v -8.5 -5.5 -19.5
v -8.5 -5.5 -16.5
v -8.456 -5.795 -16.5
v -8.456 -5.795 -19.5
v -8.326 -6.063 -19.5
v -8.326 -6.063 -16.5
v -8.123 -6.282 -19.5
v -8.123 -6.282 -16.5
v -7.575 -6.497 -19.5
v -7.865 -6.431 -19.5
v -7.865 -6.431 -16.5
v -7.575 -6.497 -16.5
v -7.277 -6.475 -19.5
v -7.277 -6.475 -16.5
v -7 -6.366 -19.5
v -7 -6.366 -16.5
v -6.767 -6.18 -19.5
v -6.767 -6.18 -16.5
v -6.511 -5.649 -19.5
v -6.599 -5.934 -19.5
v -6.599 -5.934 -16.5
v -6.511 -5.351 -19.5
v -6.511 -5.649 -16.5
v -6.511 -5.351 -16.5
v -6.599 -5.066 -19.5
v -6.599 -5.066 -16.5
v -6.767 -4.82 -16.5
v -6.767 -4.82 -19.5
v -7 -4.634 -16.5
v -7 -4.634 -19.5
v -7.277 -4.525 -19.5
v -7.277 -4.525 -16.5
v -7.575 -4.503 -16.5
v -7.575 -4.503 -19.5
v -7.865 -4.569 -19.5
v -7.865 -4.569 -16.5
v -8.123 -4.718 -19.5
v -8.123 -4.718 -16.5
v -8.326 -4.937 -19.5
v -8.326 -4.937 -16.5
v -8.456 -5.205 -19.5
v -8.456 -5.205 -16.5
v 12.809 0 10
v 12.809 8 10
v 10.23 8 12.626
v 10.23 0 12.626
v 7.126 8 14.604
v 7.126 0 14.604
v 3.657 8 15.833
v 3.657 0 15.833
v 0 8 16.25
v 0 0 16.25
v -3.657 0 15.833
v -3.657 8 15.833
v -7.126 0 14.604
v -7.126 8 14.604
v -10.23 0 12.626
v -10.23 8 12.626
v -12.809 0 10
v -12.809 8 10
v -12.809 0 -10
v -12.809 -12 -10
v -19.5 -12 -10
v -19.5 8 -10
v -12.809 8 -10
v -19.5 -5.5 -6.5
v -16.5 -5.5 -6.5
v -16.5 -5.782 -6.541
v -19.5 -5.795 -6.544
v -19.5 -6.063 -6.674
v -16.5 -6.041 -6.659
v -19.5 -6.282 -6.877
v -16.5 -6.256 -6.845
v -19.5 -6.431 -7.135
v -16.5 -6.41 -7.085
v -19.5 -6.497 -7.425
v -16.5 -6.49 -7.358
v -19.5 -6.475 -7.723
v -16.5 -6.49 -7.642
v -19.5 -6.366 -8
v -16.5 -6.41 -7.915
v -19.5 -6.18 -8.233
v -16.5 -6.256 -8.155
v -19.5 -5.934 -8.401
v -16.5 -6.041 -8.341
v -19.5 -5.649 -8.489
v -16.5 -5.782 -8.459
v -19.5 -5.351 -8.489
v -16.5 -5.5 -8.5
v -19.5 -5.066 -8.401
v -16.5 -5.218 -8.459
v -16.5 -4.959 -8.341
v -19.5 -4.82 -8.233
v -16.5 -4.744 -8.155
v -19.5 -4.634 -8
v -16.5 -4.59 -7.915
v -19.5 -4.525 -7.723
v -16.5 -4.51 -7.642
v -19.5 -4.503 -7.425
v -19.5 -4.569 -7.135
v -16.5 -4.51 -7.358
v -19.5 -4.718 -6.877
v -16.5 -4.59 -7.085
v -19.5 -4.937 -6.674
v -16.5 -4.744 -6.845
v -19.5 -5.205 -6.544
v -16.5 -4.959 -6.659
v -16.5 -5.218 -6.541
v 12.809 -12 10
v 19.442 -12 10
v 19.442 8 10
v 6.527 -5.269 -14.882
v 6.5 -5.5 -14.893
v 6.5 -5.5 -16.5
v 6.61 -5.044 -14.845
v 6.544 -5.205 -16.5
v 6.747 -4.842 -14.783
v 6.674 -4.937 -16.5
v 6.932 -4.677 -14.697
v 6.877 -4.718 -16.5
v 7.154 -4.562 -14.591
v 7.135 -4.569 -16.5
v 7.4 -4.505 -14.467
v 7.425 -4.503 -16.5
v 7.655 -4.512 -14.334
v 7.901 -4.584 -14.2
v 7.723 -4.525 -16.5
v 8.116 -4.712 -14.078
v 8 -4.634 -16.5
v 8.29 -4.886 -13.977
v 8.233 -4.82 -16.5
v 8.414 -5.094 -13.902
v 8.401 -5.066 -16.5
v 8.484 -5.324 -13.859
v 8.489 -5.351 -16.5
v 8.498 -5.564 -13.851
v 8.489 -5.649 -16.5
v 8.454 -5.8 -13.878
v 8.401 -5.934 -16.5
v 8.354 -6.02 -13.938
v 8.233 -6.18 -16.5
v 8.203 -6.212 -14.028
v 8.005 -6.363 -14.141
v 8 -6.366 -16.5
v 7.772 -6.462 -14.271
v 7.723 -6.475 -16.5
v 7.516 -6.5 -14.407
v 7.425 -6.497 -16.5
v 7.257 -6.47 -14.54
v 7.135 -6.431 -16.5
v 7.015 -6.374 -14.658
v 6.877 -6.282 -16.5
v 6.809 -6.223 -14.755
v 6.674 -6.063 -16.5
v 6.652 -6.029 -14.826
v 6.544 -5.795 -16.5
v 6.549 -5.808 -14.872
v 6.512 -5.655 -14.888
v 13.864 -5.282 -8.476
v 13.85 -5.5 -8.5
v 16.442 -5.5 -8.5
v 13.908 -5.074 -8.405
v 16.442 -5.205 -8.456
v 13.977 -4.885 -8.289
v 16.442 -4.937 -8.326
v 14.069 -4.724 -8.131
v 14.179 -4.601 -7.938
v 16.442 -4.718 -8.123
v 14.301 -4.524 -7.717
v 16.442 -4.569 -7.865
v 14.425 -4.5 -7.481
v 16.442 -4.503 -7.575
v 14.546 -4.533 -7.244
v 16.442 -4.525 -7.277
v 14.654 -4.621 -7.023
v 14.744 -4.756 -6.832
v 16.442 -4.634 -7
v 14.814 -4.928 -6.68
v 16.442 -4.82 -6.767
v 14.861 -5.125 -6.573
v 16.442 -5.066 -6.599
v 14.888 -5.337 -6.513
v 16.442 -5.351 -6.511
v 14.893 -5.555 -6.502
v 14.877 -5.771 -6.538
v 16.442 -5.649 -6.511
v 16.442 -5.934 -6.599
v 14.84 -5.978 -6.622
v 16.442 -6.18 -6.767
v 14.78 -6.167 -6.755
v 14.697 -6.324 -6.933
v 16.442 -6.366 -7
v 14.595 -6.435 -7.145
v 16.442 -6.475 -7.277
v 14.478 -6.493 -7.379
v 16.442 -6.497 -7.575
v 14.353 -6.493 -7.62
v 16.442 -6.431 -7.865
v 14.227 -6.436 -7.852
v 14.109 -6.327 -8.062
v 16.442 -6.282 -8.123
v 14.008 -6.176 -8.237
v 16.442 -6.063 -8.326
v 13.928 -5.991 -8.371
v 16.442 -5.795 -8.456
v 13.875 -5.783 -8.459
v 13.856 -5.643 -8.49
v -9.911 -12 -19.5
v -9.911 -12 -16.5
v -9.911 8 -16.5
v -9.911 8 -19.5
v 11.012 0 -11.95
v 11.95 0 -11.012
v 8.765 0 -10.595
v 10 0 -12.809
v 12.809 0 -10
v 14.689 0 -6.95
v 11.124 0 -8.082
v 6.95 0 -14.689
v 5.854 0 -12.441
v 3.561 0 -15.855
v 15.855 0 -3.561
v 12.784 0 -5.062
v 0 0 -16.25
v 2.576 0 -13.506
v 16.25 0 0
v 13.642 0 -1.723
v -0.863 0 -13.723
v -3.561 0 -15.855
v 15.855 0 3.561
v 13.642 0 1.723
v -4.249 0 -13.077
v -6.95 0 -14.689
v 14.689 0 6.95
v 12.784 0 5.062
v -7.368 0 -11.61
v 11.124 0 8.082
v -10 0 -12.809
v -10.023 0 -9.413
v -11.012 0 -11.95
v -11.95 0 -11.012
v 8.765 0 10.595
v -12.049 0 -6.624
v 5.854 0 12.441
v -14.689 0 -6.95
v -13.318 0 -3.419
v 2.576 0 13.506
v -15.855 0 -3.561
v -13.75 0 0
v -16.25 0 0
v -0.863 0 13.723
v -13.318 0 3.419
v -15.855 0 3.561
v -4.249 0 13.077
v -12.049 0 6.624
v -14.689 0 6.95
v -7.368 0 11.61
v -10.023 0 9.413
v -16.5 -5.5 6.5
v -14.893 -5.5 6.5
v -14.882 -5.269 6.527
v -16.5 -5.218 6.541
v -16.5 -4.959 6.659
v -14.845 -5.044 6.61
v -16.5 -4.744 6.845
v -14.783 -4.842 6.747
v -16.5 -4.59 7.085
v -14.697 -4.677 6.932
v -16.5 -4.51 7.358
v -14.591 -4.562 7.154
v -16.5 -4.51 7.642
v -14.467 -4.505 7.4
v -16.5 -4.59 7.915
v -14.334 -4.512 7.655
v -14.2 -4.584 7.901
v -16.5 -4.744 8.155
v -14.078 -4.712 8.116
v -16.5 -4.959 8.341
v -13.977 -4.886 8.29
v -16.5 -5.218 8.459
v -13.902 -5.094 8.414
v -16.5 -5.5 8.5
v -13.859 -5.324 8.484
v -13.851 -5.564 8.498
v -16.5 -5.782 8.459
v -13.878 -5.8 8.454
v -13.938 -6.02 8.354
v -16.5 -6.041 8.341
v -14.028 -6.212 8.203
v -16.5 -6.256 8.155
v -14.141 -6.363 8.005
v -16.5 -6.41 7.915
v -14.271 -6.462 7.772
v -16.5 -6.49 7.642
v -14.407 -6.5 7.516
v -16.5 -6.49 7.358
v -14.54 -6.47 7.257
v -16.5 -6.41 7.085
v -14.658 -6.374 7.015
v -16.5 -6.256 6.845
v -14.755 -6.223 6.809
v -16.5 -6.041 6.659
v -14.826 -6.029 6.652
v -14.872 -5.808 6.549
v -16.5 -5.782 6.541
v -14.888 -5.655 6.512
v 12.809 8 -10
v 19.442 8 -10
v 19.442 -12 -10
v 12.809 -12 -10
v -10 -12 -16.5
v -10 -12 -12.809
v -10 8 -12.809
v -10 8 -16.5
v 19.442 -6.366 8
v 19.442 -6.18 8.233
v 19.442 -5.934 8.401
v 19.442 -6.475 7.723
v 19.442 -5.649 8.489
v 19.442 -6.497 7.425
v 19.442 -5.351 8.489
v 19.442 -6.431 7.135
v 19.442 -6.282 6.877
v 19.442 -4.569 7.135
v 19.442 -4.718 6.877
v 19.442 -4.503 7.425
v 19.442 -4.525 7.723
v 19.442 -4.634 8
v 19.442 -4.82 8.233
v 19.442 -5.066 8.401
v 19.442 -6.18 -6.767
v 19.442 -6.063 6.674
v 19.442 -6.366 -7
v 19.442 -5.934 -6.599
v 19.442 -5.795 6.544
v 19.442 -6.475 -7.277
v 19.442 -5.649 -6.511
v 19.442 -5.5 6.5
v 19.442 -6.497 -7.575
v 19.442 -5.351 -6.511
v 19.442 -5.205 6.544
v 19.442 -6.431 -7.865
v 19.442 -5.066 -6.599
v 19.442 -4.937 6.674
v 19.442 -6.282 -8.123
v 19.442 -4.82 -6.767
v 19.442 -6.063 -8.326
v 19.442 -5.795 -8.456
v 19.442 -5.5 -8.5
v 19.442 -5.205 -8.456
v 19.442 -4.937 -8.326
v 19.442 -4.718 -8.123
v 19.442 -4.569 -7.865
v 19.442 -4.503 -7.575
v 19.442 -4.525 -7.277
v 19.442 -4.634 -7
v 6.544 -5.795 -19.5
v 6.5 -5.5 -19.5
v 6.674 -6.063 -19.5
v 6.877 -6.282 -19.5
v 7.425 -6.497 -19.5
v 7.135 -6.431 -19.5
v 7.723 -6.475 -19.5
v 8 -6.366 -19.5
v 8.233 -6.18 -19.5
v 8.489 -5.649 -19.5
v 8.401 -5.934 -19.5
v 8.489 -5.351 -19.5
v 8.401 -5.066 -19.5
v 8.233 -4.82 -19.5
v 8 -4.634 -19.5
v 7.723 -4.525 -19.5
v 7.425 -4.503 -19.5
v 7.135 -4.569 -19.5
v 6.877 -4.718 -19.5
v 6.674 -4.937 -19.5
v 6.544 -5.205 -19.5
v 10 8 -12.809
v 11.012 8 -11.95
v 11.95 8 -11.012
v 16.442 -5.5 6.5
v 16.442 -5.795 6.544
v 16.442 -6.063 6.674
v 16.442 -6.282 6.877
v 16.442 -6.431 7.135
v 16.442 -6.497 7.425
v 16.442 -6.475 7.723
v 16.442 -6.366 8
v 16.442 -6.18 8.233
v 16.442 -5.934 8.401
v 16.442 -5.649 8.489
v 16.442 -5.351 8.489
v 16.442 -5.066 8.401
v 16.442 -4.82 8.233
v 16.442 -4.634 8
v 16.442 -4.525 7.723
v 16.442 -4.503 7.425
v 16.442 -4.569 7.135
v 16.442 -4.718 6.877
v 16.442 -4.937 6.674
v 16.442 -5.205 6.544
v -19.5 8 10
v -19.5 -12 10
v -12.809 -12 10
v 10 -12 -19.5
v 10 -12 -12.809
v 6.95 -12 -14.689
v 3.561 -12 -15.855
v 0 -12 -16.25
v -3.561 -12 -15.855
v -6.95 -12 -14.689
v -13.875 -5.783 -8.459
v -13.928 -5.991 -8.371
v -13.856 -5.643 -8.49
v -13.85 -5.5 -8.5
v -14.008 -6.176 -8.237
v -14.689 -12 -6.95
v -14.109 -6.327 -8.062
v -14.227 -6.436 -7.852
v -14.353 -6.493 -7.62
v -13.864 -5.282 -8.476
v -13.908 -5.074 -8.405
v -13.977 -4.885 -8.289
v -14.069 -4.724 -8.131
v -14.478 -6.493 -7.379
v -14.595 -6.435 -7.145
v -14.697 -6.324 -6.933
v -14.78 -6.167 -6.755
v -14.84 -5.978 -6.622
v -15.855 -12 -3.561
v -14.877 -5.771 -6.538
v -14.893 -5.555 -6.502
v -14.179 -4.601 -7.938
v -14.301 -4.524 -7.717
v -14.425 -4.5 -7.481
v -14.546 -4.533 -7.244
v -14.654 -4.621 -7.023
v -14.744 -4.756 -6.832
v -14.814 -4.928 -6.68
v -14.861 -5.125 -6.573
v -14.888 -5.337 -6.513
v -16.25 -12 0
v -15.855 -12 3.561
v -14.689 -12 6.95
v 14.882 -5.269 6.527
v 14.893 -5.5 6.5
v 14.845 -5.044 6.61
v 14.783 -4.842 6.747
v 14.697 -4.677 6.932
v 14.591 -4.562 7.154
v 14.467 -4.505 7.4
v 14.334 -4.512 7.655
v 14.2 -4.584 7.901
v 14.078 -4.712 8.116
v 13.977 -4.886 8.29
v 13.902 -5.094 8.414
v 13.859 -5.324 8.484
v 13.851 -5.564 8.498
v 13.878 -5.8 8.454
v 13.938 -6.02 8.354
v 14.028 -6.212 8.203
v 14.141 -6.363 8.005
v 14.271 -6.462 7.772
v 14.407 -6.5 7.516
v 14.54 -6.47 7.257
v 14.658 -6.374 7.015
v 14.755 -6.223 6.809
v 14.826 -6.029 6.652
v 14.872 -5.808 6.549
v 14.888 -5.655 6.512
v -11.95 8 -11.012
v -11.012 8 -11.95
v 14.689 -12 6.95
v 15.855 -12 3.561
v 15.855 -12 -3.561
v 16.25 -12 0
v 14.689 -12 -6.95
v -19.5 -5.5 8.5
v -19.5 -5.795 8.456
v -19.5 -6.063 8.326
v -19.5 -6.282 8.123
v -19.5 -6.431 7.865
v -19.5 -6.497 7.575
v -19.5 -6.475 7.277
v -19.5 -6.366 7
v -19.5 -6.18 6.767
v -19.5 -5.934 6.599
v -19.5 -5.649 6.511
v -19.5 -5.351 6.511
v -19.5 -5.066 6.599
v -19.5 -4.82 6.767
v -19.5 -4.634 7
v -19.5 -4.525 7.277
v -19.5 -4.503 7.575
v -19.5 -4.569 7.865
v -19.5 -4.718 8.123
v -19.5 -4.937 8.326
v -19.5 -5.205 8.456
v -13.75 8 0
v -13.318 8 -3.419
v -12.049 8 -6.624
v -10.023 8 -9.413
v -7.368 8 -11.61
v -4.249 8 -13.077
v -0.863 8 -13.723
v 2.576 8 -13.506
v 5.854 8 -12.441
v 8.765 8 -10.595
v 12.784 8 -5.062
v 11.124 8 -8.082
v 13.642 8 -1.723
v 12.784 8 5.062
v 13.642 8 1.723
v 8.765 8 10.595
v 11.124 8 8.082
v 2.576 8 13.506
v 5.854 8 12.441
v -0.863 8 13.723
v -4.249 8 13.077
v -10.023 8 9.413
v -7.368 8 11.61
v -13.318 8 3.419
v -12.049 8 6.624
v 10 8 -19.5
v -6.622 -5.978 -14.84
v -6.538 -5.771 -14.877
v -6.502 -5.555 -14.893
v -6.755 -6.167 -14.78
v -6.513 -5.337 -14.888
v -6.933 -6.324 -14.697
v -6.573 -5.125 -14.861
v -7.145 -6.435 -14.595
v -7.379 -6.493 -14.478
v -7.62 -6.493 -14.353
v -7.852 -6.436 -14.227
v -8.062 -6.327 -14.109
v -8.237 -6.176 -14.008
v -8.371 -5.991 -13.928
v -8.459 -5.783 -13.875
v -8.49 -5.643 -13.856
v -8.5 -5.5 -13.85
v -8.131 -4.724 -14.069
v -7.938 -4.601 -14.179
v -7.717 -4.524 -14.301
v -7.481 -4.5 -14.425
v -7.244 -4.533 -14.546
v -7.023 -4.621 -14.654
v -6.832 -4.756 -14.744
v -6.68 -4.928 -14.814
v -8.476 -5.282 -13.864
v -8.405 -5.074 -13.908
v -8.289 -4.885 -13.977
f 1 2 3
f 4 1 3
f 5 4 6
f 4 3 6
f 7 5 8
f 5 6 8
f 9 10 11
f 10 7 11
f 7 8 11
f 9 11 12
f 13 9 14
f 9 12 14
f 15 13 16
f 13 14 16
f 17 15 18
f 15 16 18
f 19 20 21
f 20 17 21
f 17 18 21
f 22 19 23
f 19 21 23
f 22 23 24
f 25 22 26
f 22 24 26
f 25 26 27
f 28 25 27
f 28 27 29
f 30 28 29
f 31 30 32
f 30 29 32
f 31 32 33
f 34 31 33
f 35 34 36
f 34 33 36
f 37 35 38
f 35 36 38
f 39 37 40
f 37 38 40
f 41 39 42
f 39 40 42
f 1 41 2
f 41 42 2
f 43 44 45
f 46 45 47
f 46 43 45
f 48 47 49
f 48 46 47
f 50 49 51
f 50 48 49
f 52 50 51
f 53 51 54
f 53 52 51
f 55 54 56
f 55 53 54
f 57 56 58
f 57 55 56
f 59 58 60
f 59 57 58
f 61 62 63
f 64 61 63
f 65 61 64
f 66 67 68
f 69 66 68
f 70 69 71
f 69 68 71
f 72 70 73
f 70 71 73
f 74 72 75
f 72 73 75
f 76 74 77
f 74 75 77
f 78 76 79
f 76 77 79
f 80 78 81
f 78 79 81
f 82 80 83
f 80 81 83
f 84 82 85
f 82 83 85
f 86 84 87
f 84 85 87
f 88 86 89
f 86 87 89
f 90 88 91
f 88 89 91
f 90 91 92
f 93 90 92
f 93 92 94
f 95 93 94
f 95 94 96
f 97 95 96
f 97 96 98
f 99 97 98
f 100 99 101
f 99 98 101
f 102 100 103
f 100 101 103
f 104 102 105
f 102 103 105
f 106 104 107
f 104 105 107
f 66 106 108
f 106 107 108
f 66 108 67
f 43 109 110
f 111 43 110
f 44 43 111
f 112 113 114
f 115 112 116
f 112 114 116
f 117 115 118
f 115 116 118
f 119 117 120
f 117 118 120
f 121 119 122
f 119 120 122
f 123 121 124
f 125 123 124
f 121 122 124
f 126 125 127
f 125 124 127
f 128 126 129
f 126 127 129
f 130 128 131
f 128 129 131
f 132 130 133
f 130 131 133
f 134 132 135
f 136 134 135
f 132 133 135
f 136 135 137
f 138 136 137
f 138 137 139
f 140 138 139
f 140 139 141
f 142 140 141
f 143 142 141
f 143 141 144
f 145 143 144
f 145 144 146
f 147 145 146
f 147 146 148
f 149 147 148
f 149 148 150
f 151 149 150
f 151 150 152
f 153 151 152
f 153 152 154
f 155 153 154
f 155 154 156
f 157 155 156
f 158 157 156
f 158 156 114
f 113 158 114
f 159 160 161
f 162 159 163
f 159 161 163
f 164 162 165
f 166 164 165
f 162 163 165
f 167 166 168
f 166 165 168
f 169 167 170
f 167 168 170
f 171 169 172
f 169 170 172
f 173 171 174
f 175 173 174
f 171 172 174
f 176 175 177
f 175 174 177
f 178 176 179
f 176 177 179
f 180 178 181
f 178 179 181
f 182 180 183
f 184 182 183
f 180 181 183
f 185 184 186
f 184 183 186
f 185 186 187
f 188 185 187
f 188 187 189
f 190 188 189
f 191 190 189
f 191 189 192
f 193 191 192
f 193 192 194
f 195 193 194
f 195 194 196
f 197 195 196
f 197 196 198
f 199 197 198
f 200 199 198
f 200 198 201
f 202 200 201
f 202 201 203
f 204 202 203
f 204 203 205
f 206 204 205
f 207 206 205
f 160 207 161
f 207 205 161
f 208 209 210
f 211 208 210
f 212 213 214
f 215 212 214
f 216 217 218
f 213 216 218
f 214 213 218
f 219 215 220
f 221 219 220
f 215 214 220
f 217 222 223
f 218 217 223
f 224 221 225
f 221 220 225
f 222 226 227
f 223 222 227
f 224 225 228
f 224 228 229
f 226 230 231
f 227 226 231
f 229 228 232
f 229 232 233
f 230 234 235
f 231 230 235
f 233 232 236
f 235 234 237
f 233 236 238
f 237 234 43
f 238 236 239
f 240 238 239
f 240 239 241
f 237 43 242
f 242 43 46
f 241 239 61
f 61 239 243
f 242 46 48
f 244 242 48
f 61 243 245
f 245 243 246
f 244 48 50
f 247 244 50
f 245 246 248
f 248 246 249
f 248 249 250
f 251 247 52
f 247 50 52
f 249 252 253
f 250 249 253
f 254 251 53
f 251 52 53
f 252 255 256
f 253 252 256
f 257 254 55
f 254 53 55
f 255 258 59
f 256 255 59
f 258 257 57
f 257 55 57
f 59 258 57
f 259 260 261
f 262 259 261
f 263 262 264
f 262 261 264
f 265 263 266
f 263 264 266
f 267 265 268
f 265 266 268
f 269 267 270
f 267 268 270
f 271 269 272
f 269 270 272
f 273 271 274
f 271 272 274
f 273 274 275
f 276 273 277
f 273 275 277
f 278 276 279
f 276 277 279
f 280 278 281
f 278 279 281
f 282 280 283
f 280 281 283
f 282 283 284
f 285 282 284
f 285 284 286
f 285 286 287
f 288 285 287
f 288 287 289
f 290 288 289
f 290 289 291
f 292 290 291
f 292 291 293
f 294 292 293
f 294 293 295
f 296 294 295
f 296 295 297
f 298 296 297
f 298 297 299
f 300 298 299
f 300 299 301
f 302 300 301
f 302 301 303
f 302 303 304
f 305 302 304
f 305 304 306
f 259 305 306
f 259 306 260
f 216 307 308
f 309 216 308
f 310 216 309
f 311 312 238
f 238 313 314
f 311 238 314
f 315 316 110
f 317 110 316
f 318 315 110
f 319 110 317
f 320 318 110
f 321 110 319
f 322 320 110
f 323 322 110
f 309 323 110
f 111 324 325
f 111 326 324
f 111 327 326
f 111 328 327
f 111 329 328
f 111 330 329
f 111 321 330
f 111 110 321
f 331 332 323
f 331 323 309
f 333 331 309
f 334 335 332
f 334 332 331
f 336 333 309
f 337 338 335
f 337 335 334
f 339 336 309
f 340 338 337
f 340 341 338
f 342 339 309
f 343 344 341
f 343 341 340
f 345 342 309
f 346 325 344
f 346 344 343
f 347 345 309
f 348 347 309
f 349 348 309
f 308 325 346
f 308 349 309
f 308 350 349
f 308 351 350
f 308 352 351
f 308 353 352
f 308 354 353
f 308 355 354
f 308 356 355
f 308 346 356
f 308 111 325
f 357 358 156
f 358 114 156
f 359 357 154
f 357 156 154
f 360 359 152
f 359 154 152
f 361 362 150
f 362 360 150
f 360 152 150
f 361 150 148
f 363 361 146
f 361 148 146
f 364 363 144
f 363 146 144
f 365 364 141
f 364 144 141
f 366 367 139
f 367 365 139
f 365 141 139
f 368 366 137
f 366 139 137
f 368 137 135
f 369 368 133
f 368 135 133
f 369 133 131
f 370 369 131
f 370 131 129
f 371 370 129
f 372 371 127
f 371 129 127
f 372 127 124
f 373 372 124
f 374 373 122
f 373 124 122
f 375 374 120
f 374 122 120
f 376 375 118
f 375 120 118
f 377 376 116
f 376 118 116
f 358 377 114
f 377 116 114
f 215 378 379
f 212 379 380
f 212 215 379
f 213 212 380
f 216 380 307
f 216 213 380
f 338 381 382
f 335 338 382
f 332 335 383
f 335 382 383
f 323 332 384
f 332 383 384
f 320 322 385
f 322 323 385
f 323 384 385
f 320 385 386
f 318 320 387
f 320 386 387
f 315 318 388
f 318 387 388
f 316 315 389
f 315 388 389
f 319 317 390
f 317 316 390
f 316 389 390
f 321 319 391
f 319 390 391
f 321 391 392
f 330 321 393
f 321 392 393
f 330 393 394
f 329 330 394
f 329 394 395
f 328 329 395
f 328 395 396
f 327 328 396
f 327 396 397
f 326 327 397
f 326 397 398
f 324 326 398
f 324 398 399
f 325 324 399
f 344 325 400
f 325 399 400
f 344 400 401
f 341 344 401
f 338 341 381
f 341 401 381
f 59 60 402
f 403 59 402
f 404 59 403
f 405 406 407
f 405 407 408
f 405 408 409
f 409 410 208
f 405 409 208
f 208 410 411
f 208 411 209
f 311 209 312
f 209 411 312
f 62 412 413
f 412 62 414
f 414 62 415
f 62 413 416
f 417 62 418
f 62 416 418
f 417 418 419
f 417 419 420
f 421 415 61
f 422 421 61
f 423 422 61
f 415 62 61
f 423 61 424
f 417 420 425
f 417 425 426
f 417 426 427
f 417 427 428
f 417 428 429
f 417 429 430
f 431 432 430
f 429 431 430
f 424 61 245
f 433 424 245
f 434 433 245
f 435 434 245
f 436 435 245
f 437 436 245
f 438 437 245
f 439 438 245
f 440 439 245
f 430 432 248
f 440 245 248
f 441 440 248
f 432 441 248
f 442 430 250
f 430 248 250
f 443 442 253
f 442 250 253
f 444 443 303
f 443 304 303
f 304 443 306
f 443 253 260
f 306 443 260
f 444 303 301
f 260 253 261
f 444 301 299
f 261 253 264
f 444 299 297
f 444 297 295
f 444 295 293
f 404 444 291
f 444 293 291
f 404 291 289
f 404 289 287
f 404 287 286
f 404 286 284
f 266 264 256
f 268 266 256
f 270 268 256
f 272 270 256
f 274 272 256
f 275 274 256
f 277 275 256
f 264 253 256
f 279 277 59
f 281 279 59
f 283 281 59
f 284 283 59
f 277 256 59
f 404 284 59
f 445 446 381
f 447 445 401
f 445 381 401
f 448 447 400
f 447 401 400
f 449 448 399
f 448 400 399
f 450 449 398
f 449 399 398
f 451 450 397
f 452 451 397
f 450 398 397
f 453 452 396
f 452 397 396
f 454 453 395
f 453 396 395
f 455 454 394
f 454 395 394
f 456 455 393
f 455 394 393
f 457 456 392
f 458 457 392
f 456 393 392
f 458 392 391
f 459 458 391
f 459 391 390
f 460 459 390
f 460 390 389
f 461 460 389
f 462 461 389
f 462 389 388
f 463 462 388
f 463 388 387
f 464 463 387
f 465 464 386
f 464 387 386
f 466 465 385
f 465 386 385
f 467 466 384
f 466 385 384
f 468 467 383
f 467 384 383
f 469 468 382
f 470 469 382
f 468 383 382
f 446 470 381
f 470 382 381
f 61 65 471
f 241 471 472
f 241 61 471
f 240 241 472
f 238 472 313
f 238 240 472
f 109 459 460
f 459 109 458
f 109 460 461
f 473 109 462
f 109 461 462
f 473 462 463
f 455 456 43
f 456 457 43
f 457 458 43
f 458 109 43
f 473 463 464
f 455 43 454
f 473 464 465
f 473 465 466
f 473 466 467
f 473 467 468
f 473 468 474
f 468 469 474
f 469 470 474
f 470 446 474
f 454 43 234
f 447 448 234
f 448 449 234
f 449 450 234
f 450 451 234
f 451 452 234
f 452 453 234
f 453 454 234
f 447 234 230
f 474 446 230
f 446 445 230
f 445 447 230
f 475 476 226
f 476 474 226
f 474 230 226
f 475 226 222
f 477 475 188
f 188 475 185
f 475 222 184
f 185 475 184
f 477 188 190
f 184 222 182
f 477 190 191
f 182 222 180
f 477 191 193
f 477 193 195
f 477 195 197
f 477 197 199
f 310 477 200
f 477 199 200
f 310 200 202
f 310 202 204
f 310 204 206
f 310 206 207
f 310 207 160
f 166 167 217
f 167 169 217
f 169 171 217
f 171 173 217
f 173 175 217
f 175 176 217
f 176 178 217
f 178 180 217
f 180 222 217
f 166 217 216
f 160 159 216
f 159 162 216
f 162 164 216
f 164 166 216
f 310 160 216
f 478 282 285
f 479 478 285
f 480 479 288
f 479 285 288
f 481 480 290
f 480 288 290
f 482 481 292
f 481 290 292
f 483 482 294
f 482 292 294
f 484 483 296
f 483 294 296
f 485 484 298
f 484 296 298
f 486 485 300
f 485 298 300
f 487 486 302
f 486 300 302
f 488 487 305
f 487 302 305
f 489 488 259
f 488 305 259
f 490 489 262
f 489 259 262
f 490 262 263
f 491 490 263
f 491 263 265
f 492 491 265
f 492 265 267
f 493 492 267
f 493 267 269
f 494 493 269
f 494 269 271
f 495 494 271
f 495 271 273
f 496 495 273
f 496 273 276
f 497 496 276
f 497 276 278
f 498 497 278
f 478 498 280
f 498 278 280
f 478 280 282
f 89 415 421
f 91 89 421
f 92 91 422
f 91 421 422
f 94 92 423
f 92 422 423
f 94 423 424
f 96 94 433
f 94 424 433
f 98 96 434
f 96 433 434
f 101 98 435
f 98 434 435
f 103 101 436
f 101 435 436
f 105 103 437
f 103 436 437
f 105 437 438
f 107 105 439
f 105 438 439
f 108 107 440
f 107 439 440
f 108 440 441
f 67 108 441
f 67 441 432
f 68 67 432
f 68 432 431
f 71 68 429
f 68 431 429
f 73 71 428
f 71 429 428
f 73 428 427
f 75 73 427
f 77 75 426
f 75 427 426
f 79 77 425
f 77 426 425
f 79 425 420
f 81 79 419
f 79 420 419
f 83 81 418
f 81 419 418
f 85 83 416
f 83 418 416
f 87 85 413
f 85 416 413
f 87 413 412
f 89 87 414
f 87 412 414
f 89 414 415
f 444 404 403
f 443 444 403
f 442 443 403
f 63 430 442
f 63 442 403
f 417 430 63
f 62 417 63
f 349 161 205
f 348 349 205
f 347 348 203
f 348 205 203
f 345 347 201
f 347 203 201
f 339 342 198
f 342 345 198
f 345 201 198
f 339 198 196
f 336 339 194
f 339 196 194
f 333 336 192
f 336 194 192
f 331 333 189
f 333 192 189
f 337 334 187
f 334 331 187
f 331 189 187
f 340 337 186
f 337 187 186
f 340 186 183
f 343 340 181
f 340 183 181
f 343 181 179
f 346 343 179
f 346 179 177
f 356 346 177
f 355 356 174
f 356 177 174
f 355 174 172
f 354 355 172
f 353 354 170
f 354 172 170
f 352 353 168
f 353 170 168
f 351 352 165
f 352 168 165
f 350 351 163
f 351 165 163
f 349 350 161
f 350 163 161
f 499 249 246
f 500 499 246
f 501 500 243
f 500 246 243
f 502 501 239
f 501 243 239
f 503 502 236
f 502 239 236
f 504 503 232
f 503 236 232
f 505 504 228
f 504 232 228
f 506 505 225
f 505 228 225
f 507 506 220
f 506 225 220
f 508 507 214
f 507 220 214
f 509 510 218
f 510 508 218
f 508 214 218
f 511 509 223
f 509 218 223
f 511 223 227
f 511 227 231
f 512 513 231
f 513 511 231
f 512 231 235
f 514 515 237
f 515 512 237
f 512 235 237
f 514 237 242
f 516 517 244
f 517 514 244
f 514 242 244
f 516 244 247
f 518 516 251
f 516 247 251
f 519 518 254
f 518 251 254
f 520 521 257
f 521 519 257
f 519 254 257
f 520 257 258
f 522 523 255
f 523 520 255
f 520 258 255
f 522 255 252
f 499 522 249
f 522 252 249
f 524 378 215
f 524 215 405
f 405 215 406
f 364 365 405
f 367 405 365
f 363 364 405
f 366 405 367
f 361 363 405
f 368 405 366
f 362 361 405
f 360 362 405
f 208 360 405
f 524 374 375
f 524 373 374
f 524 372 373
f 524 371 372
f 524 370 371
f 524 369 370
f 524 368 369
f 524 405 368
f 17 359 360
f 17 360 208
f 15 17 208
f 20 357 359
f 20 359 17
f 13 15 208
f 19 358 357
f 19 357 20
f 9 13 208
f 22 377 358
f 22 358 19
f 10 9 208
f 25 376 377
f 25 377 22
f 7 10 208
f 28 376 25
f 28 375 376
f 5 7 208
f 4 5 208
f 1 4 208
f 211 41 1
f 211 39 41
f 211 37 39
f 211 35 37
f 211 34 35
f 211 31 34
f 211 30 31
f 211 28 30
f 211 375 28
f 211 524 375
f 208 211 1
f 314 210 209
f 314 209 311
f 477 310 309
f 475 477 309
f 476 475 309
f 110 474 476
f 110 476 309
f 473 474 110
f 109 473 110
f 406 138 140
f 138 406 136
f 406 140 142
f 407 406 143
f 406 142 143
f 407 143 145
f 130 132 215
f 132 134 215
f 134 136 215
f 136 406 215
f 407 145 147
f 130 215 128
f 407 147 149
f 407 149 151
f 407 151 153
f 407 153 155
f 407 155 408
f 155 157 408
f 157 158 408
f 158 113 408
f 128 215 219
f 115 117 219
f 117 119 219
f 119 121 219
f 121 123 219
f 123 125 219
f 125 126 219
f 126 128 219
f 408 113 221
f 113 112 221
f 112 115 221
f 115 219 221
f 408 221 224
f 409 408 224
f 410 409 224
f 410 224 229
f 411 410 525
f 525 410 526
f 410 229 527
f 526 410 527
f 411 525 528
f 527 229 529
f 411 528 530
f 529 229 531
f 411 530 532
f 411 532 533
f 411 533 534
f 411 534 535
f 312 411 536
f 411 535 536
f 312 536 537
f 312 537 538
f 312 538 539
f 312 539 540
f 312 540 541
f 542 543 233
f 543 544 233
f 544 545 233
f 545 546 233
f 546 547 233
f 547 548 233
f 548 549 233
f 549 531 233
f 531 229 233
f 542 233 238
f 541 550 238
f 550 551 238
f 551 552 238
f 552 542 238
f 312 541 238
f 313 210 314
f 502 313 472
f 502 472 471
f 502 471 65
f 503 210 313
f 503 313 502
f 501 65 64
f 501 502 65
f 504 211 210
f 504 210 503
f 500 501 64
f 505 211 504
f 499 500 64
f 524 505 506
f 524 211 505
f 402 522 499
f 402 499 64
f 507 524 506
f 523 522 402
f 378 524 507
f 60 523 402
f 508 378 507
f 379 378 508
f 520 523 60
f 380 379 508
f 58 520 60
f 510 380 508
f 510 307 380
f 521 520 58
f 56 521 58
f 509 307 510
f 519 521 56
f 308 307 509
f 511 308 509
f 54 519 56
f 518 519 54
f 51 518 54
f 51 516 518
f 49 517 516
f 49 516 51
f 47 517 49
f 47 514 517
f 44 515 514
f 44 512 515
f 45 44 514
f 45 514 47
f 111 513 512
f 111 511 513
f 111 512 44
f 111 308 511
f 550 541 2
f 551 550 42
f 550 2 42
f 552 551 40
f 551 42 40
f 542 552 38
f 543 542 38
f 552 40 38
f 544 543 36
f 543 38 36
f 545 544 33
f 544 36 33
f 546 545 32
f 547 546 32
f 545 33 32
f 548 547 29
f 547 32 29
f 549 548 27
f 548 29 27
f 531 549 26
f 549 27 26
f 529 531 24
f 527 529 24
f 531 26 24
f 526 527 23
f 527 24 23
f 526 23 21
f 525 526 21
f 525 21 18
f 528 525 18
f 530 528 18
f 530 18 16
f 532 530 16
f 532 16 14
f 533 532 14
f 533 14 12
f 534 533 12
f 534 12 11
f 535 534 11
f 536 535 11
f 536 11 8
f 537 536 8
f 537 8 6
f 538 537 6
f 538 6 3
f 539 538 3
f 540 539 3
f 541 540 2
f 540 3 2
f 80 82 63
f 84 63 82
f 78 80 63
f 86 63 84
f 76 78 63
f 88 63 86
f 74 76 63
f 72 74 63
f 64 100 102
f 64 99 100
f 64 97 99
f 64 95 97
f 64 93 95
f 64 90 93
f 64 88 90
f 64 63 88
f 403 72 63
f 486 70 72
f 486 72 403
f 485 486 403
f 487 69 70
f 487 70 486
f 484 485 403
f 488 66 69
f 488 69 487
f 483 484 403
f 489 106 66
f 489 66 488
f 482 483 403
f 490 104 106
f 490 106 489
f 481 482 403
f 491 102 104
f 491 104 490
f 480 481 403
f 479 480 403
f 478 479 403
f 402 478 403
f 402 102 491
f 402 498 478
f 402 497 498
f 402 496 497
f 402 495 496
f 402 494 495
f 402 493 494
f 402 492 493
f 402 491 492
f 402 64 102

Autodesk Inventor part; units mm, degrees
ref_plane "YZ Plane" through (0, 0, 0) normal (1, 0, 0) x (0, 1, 0)
ref_plane "XZ Plane" through (0, 0, 0) normal (0, 1, 0) x (-1, 0, 0)
sketch "Sketch1" plane through (0, 0, 0) normal (0, 1, 0) x (-1, 0, 0)
  circle A0 centre (0, 0) radius 13.75
  circle A1 centre (0, 0) radius 16.25
  dimension "d0" = 27.5
  dimension "d5" = 32.5
sketch "Sketch2" plane through (0, 0, 0) normal (0, 1, 0) x (-1, 0, 0)
  line L0 (21.5, 21.5) -> (-21.5, 21.5)
  line L1 (-21.5, 21.5) -> (-21.5, -21.5)
  line L2 (-21.5, -21.5) -> (21.5, -21.5)
  line L3 (21.5, -21.5) -> (21.5, 21.5)
  point P0 (0, 0)
  dimension "d1" = 43
  dimension "d2" = 43
  dimension "d3" = 21.5
  dimension "d4" = 21.5
extrude "Extrusion1" add sketch "Sketch1" along normal blind 8
sketch "Sketch3" plane through (0, 8, 0) normal (0, 1, 0) x (1, 0, 0)
  line L0 (-17.7413, 16.25) -> (19.579, 16.25) construction
  line L1 (16.25, -18.4481) -> (16.25, 20.2858) construction
  line L2 (-16.25, -20.7099) -> (-16.25, 21.9822) construction
  line L3 (-16.5, 16.25) -> (16.5, 16.25) construction
  line L4 (16.5, 16.25) -> (16.5, 31.25) construction
  line L5 (16.5, 31.25) -> (-16.5, 31.25) construction
  line L6 (-16.5, 31.25) -> (-16.5, 16.25) construction
  circle A0 centre (0, 0) radius 16.25 projected
  line L7 (-16.25, -16.5) -> (-31.25, -16.5) construction
  line L8 (-31.25, -16.5) -> (-31.25, 16.5) construction
  line L9 (-31.25, 16.5) -> (-16.25, 16.5) construction
  line L10 (-16.25, 16.5) -> (-16.25, -16.5) construction
  line L11 (16.25, -16.5) -> (31.25, -16.5) construction
  line L12 (31.25, -16.5) -> (31.25, 16.5) construction
  line L13 (31.25, 16.5) -> (16.25, 16.5) construction
  line L14 (16.25, 16.5) -> (16.25, -16.5) construction
  line L15 (-16.5, -16.5) -> (16.25, -16.5)
  line L16 (16.5, 16.5) -> (16.5, 16.25)
  line L17 (-10, 12.8087) -> (-10, 16.5)
  line L18 (10, 12.8087) -> (10, 16.5)
  line L19 (16.5, 16.5) -> (-10, 16.5)
  line L20 (-16.25, 16.5) -> (-16.5, 16.5)
  line L21 (-16.5, 16.5) -> (-16.5, 16.25)
  line L22 (-16.5, 10) -> (-16.5, -10)
  line L23 (16.4416, -10) -> (16.4416, 10)
  circle A1 centre (0, 0) radius 16.25
  line L24 (-16.5, 10) -> (-12.8087, 10)
  line L25 (12.8087, 10) -> (16.4416, 10)
  line L26 (16.4416, -10) -> (12.8087, -10)
  line L27 (-12.8087, -10) -> (-16.5, -10)
  dimension "d8" = 33
  dimension "d9" = 15
  dimension "d10" = 16.5
  dimension "d11" = 15
  dimension "d12" = 16.5
  dimension "d13" = 33
  dimension "d14" = 16.5
  dimension "d15" = 15
  dimension "d16" = 33
  dimension "d20" = 10
  dimension "d21" = 10
extrude "Extrusion2" add sketch "Sketch3" against normal blind 20 contours A0 L25 L23 L26 | A0 L17 L19 L18 | L27 L22 L24 A0
sketch "Sketch4" plane through (16.4416, 8, 10) normal (1, 0, 0) x (0, 0, -1)
  line L0 (20, -20) -> (0, -20) projected
  line L1 (-3.75, 0) -> (23.75, 0) projected
  line L2 (-6.5, -20) -> (26.5, -20)
  line L3 (26.5, -20) -> (26.5, 0)
  line L4 (26.5, 0) -> (-6.5, 0)
  line L5 (-6.5, 0) -> (-6.5, -20)
  line L6 (10, 0) -> (10, -20) construction
  line L7 (2.5, 0) -> (2.5, -20) construction
  line L8 (17.5, 0) -> (17.5, -20) construction
  line L9 (-6.5, -13.5) -> (26.5, -13.5) construction
  line L10 (22.8087, -8) -> (20, -8) projected
  circle A0 centre (2.5, -13.5) radius 1
  circle A1 centre (17.5, -13.5) radius 1
  point P0 (10, -8)
  dimension "d26" = 33
  dimension "d27" = 20
  dimension "d28" = 16.5
  dimension "d29" = 7.5
  dimension "d30" = 7.5
  dimension "d31" = 5.5
  dimension "d32" = 2
  dimension "d33" = 2
extrude "Extrusion3" cut sketch "Sketch4" against normal through all contours A0 | A1
sketch "Sketch5" plane through (10, 8, -16.5) normal (0, 0, -1) x (-1, 0, 0)
  line L0 (-10.5226, -13.5) -> (32.3111, -13.5) construction
  line L1 (0, -8) -> (-2.8087, -8) projected
  circle A0 centre (2.5, -13.5) radius 1
  circle A1 centre (17.5, -13.5) radius 1
  point P0 (10, -8)
  dimension "d36" = 5.5
  dimension "d37" = 2
  dimension "d38" = 2
  dimension "d39" = 7.5
  dimension "d40" = 7.5
extrude "Extrusion4" cut sketch "Sketch5" against normal through all
ref_plane "Work Plane1" through (0, 0, 16.25) normal (0, 0, 1) x (1, 0, 0)
sketch "Sketch9" plane through (16.4416, 8, 10) normal (1, 0, 0) x (0, 0, -1)
  line L0 (0, 0) -> (-6.25, 0) projected
  line L1 (20, -20) -> (0, -20) projected
  line L2 (0, 0) -> (20, 0)
  line L3 (20, 0) -> (20, -20)
  line L4 (20, -20) -> (0, -20)
  line L5 (0, -20) -> (0, 0)
  circle A0 centre (2.5, -13.5) radius 1 projected
  circle A1 centre (2.5, -13.5) radius 1
  circle A2 centre (17.5, -13.5) radius 1 projected
  circle A3 centre (17.5, -13.5) radius 1
  point P0 (10, -8)
extrude "Extrusion7" add sketch "Sketch9" along normal blind 3
sketch "Sketch10" plane through (10, 8, -16.5) normal (0, 0, -1) x (-1, 0, 0)
  line L0 (-3.75, 0) -> (23.75, 0) projected
  line L1 (0, -8) -> (0, -20) projected
  line L2 (19.9113, 0) -> (0, 0)
  line L3 (0, 0) -> (0, -20)
  line L4 (0, -20) -> (19.9113, -20)
  line L5 (19.9113, -20) -> (19.9113, 0)
  circle A0 centre (17.5, -13.5) radius 1 projected
  circle A1 centre (17.5, -13.5) radius 1
  circle A2 centre (2.5, -13.5) radius 1 projected
  circle A3 centre (2.5, -13.5) radius 1
  point P0 (10, -8)
extrude "Extrusion8" add sketch "Sketch10" along normal blind 3
sketch "Sketch11" plane through (-16.5, 8, -10) normal (-1, 0, 0) x (0, 0, 1)
  line L0 (0, 0) -> (-2.8087, 0) projected
  line L1 (20, -20) -> (0, -20) projected
  line L2 (0, 0) -> (20, 0)
  line L3 (20, 0) -> (20, -20)
  line L4 (20, -20) -> (0, -20)
  line L5 (0, -20) -> (0, 0)
  circle A0 centre (17.5, -13.5) radius 1 projected
  circle A1 centre (17.5, -13.5) radius 1
  circle A2 centre (2.5, -13.5) radius 1 projected
  circle A3 centre (2.5, -13.5) radius 1
  point P0 (10, -8)
extrude "Extrusion9" add sketch "Sketch11" along normal blind 3
sketch "Sketch6" plane through (0, 0, 16.25) normal (0, 0, 1) x (1, 0, 0)
  line L0 (10, 8) -> (-10, 8) projected
  line L1 (-10.5, 8) -> (10.5, 8)
  line L2 (10.5, 8) -> (10.5, -23)
  line L3 (10.5, -23) -> (-10.5, -23)
  line L4 (-10.5, -23) -> (-10.5, 8)
  circle A0 centre (-5.7, -21) radius 1
  circle A1 centre (5.7, -21) radius 1
  point P0 (0, 0)
  dimension "d44" = 21
  dimension "d45" = 10.5
  dimension "d46" = 31
  dimension "d47" = 2
  dimension "d48" = 2
  dimension "d49" = 4.8
  dimension "d50" = 4.8
  dimension "d51" = 2
  dimension "d52" = 2
sketch "Sketch7" plane through (16.4416, 8, 10) normal (1, 0, 0) x (0, 0, -1)
  line L0 (0, -8) -> (0, -20) projected
  line L1 (20, -8) -> (20, 0) projected
  line L2 (0, -20) -> (20, -20)
  line L3 (20, -20) -> (20, 0)
  line L4 (20, 0) -> (0, 0)
  line L5 (0, 0) -> (0, -20)
  circle A0 centre (2.5, -13.5) radius 1 projected
  circle A1 centre (2.5, -13.5) radius 1
  circle A2 centre (17.5, -13.5) radius 1 projected
  circle A3 centre (17.5, -13.5) radius 1
  point P0 (10, -8)
properties part number "Battery and PI holder"
